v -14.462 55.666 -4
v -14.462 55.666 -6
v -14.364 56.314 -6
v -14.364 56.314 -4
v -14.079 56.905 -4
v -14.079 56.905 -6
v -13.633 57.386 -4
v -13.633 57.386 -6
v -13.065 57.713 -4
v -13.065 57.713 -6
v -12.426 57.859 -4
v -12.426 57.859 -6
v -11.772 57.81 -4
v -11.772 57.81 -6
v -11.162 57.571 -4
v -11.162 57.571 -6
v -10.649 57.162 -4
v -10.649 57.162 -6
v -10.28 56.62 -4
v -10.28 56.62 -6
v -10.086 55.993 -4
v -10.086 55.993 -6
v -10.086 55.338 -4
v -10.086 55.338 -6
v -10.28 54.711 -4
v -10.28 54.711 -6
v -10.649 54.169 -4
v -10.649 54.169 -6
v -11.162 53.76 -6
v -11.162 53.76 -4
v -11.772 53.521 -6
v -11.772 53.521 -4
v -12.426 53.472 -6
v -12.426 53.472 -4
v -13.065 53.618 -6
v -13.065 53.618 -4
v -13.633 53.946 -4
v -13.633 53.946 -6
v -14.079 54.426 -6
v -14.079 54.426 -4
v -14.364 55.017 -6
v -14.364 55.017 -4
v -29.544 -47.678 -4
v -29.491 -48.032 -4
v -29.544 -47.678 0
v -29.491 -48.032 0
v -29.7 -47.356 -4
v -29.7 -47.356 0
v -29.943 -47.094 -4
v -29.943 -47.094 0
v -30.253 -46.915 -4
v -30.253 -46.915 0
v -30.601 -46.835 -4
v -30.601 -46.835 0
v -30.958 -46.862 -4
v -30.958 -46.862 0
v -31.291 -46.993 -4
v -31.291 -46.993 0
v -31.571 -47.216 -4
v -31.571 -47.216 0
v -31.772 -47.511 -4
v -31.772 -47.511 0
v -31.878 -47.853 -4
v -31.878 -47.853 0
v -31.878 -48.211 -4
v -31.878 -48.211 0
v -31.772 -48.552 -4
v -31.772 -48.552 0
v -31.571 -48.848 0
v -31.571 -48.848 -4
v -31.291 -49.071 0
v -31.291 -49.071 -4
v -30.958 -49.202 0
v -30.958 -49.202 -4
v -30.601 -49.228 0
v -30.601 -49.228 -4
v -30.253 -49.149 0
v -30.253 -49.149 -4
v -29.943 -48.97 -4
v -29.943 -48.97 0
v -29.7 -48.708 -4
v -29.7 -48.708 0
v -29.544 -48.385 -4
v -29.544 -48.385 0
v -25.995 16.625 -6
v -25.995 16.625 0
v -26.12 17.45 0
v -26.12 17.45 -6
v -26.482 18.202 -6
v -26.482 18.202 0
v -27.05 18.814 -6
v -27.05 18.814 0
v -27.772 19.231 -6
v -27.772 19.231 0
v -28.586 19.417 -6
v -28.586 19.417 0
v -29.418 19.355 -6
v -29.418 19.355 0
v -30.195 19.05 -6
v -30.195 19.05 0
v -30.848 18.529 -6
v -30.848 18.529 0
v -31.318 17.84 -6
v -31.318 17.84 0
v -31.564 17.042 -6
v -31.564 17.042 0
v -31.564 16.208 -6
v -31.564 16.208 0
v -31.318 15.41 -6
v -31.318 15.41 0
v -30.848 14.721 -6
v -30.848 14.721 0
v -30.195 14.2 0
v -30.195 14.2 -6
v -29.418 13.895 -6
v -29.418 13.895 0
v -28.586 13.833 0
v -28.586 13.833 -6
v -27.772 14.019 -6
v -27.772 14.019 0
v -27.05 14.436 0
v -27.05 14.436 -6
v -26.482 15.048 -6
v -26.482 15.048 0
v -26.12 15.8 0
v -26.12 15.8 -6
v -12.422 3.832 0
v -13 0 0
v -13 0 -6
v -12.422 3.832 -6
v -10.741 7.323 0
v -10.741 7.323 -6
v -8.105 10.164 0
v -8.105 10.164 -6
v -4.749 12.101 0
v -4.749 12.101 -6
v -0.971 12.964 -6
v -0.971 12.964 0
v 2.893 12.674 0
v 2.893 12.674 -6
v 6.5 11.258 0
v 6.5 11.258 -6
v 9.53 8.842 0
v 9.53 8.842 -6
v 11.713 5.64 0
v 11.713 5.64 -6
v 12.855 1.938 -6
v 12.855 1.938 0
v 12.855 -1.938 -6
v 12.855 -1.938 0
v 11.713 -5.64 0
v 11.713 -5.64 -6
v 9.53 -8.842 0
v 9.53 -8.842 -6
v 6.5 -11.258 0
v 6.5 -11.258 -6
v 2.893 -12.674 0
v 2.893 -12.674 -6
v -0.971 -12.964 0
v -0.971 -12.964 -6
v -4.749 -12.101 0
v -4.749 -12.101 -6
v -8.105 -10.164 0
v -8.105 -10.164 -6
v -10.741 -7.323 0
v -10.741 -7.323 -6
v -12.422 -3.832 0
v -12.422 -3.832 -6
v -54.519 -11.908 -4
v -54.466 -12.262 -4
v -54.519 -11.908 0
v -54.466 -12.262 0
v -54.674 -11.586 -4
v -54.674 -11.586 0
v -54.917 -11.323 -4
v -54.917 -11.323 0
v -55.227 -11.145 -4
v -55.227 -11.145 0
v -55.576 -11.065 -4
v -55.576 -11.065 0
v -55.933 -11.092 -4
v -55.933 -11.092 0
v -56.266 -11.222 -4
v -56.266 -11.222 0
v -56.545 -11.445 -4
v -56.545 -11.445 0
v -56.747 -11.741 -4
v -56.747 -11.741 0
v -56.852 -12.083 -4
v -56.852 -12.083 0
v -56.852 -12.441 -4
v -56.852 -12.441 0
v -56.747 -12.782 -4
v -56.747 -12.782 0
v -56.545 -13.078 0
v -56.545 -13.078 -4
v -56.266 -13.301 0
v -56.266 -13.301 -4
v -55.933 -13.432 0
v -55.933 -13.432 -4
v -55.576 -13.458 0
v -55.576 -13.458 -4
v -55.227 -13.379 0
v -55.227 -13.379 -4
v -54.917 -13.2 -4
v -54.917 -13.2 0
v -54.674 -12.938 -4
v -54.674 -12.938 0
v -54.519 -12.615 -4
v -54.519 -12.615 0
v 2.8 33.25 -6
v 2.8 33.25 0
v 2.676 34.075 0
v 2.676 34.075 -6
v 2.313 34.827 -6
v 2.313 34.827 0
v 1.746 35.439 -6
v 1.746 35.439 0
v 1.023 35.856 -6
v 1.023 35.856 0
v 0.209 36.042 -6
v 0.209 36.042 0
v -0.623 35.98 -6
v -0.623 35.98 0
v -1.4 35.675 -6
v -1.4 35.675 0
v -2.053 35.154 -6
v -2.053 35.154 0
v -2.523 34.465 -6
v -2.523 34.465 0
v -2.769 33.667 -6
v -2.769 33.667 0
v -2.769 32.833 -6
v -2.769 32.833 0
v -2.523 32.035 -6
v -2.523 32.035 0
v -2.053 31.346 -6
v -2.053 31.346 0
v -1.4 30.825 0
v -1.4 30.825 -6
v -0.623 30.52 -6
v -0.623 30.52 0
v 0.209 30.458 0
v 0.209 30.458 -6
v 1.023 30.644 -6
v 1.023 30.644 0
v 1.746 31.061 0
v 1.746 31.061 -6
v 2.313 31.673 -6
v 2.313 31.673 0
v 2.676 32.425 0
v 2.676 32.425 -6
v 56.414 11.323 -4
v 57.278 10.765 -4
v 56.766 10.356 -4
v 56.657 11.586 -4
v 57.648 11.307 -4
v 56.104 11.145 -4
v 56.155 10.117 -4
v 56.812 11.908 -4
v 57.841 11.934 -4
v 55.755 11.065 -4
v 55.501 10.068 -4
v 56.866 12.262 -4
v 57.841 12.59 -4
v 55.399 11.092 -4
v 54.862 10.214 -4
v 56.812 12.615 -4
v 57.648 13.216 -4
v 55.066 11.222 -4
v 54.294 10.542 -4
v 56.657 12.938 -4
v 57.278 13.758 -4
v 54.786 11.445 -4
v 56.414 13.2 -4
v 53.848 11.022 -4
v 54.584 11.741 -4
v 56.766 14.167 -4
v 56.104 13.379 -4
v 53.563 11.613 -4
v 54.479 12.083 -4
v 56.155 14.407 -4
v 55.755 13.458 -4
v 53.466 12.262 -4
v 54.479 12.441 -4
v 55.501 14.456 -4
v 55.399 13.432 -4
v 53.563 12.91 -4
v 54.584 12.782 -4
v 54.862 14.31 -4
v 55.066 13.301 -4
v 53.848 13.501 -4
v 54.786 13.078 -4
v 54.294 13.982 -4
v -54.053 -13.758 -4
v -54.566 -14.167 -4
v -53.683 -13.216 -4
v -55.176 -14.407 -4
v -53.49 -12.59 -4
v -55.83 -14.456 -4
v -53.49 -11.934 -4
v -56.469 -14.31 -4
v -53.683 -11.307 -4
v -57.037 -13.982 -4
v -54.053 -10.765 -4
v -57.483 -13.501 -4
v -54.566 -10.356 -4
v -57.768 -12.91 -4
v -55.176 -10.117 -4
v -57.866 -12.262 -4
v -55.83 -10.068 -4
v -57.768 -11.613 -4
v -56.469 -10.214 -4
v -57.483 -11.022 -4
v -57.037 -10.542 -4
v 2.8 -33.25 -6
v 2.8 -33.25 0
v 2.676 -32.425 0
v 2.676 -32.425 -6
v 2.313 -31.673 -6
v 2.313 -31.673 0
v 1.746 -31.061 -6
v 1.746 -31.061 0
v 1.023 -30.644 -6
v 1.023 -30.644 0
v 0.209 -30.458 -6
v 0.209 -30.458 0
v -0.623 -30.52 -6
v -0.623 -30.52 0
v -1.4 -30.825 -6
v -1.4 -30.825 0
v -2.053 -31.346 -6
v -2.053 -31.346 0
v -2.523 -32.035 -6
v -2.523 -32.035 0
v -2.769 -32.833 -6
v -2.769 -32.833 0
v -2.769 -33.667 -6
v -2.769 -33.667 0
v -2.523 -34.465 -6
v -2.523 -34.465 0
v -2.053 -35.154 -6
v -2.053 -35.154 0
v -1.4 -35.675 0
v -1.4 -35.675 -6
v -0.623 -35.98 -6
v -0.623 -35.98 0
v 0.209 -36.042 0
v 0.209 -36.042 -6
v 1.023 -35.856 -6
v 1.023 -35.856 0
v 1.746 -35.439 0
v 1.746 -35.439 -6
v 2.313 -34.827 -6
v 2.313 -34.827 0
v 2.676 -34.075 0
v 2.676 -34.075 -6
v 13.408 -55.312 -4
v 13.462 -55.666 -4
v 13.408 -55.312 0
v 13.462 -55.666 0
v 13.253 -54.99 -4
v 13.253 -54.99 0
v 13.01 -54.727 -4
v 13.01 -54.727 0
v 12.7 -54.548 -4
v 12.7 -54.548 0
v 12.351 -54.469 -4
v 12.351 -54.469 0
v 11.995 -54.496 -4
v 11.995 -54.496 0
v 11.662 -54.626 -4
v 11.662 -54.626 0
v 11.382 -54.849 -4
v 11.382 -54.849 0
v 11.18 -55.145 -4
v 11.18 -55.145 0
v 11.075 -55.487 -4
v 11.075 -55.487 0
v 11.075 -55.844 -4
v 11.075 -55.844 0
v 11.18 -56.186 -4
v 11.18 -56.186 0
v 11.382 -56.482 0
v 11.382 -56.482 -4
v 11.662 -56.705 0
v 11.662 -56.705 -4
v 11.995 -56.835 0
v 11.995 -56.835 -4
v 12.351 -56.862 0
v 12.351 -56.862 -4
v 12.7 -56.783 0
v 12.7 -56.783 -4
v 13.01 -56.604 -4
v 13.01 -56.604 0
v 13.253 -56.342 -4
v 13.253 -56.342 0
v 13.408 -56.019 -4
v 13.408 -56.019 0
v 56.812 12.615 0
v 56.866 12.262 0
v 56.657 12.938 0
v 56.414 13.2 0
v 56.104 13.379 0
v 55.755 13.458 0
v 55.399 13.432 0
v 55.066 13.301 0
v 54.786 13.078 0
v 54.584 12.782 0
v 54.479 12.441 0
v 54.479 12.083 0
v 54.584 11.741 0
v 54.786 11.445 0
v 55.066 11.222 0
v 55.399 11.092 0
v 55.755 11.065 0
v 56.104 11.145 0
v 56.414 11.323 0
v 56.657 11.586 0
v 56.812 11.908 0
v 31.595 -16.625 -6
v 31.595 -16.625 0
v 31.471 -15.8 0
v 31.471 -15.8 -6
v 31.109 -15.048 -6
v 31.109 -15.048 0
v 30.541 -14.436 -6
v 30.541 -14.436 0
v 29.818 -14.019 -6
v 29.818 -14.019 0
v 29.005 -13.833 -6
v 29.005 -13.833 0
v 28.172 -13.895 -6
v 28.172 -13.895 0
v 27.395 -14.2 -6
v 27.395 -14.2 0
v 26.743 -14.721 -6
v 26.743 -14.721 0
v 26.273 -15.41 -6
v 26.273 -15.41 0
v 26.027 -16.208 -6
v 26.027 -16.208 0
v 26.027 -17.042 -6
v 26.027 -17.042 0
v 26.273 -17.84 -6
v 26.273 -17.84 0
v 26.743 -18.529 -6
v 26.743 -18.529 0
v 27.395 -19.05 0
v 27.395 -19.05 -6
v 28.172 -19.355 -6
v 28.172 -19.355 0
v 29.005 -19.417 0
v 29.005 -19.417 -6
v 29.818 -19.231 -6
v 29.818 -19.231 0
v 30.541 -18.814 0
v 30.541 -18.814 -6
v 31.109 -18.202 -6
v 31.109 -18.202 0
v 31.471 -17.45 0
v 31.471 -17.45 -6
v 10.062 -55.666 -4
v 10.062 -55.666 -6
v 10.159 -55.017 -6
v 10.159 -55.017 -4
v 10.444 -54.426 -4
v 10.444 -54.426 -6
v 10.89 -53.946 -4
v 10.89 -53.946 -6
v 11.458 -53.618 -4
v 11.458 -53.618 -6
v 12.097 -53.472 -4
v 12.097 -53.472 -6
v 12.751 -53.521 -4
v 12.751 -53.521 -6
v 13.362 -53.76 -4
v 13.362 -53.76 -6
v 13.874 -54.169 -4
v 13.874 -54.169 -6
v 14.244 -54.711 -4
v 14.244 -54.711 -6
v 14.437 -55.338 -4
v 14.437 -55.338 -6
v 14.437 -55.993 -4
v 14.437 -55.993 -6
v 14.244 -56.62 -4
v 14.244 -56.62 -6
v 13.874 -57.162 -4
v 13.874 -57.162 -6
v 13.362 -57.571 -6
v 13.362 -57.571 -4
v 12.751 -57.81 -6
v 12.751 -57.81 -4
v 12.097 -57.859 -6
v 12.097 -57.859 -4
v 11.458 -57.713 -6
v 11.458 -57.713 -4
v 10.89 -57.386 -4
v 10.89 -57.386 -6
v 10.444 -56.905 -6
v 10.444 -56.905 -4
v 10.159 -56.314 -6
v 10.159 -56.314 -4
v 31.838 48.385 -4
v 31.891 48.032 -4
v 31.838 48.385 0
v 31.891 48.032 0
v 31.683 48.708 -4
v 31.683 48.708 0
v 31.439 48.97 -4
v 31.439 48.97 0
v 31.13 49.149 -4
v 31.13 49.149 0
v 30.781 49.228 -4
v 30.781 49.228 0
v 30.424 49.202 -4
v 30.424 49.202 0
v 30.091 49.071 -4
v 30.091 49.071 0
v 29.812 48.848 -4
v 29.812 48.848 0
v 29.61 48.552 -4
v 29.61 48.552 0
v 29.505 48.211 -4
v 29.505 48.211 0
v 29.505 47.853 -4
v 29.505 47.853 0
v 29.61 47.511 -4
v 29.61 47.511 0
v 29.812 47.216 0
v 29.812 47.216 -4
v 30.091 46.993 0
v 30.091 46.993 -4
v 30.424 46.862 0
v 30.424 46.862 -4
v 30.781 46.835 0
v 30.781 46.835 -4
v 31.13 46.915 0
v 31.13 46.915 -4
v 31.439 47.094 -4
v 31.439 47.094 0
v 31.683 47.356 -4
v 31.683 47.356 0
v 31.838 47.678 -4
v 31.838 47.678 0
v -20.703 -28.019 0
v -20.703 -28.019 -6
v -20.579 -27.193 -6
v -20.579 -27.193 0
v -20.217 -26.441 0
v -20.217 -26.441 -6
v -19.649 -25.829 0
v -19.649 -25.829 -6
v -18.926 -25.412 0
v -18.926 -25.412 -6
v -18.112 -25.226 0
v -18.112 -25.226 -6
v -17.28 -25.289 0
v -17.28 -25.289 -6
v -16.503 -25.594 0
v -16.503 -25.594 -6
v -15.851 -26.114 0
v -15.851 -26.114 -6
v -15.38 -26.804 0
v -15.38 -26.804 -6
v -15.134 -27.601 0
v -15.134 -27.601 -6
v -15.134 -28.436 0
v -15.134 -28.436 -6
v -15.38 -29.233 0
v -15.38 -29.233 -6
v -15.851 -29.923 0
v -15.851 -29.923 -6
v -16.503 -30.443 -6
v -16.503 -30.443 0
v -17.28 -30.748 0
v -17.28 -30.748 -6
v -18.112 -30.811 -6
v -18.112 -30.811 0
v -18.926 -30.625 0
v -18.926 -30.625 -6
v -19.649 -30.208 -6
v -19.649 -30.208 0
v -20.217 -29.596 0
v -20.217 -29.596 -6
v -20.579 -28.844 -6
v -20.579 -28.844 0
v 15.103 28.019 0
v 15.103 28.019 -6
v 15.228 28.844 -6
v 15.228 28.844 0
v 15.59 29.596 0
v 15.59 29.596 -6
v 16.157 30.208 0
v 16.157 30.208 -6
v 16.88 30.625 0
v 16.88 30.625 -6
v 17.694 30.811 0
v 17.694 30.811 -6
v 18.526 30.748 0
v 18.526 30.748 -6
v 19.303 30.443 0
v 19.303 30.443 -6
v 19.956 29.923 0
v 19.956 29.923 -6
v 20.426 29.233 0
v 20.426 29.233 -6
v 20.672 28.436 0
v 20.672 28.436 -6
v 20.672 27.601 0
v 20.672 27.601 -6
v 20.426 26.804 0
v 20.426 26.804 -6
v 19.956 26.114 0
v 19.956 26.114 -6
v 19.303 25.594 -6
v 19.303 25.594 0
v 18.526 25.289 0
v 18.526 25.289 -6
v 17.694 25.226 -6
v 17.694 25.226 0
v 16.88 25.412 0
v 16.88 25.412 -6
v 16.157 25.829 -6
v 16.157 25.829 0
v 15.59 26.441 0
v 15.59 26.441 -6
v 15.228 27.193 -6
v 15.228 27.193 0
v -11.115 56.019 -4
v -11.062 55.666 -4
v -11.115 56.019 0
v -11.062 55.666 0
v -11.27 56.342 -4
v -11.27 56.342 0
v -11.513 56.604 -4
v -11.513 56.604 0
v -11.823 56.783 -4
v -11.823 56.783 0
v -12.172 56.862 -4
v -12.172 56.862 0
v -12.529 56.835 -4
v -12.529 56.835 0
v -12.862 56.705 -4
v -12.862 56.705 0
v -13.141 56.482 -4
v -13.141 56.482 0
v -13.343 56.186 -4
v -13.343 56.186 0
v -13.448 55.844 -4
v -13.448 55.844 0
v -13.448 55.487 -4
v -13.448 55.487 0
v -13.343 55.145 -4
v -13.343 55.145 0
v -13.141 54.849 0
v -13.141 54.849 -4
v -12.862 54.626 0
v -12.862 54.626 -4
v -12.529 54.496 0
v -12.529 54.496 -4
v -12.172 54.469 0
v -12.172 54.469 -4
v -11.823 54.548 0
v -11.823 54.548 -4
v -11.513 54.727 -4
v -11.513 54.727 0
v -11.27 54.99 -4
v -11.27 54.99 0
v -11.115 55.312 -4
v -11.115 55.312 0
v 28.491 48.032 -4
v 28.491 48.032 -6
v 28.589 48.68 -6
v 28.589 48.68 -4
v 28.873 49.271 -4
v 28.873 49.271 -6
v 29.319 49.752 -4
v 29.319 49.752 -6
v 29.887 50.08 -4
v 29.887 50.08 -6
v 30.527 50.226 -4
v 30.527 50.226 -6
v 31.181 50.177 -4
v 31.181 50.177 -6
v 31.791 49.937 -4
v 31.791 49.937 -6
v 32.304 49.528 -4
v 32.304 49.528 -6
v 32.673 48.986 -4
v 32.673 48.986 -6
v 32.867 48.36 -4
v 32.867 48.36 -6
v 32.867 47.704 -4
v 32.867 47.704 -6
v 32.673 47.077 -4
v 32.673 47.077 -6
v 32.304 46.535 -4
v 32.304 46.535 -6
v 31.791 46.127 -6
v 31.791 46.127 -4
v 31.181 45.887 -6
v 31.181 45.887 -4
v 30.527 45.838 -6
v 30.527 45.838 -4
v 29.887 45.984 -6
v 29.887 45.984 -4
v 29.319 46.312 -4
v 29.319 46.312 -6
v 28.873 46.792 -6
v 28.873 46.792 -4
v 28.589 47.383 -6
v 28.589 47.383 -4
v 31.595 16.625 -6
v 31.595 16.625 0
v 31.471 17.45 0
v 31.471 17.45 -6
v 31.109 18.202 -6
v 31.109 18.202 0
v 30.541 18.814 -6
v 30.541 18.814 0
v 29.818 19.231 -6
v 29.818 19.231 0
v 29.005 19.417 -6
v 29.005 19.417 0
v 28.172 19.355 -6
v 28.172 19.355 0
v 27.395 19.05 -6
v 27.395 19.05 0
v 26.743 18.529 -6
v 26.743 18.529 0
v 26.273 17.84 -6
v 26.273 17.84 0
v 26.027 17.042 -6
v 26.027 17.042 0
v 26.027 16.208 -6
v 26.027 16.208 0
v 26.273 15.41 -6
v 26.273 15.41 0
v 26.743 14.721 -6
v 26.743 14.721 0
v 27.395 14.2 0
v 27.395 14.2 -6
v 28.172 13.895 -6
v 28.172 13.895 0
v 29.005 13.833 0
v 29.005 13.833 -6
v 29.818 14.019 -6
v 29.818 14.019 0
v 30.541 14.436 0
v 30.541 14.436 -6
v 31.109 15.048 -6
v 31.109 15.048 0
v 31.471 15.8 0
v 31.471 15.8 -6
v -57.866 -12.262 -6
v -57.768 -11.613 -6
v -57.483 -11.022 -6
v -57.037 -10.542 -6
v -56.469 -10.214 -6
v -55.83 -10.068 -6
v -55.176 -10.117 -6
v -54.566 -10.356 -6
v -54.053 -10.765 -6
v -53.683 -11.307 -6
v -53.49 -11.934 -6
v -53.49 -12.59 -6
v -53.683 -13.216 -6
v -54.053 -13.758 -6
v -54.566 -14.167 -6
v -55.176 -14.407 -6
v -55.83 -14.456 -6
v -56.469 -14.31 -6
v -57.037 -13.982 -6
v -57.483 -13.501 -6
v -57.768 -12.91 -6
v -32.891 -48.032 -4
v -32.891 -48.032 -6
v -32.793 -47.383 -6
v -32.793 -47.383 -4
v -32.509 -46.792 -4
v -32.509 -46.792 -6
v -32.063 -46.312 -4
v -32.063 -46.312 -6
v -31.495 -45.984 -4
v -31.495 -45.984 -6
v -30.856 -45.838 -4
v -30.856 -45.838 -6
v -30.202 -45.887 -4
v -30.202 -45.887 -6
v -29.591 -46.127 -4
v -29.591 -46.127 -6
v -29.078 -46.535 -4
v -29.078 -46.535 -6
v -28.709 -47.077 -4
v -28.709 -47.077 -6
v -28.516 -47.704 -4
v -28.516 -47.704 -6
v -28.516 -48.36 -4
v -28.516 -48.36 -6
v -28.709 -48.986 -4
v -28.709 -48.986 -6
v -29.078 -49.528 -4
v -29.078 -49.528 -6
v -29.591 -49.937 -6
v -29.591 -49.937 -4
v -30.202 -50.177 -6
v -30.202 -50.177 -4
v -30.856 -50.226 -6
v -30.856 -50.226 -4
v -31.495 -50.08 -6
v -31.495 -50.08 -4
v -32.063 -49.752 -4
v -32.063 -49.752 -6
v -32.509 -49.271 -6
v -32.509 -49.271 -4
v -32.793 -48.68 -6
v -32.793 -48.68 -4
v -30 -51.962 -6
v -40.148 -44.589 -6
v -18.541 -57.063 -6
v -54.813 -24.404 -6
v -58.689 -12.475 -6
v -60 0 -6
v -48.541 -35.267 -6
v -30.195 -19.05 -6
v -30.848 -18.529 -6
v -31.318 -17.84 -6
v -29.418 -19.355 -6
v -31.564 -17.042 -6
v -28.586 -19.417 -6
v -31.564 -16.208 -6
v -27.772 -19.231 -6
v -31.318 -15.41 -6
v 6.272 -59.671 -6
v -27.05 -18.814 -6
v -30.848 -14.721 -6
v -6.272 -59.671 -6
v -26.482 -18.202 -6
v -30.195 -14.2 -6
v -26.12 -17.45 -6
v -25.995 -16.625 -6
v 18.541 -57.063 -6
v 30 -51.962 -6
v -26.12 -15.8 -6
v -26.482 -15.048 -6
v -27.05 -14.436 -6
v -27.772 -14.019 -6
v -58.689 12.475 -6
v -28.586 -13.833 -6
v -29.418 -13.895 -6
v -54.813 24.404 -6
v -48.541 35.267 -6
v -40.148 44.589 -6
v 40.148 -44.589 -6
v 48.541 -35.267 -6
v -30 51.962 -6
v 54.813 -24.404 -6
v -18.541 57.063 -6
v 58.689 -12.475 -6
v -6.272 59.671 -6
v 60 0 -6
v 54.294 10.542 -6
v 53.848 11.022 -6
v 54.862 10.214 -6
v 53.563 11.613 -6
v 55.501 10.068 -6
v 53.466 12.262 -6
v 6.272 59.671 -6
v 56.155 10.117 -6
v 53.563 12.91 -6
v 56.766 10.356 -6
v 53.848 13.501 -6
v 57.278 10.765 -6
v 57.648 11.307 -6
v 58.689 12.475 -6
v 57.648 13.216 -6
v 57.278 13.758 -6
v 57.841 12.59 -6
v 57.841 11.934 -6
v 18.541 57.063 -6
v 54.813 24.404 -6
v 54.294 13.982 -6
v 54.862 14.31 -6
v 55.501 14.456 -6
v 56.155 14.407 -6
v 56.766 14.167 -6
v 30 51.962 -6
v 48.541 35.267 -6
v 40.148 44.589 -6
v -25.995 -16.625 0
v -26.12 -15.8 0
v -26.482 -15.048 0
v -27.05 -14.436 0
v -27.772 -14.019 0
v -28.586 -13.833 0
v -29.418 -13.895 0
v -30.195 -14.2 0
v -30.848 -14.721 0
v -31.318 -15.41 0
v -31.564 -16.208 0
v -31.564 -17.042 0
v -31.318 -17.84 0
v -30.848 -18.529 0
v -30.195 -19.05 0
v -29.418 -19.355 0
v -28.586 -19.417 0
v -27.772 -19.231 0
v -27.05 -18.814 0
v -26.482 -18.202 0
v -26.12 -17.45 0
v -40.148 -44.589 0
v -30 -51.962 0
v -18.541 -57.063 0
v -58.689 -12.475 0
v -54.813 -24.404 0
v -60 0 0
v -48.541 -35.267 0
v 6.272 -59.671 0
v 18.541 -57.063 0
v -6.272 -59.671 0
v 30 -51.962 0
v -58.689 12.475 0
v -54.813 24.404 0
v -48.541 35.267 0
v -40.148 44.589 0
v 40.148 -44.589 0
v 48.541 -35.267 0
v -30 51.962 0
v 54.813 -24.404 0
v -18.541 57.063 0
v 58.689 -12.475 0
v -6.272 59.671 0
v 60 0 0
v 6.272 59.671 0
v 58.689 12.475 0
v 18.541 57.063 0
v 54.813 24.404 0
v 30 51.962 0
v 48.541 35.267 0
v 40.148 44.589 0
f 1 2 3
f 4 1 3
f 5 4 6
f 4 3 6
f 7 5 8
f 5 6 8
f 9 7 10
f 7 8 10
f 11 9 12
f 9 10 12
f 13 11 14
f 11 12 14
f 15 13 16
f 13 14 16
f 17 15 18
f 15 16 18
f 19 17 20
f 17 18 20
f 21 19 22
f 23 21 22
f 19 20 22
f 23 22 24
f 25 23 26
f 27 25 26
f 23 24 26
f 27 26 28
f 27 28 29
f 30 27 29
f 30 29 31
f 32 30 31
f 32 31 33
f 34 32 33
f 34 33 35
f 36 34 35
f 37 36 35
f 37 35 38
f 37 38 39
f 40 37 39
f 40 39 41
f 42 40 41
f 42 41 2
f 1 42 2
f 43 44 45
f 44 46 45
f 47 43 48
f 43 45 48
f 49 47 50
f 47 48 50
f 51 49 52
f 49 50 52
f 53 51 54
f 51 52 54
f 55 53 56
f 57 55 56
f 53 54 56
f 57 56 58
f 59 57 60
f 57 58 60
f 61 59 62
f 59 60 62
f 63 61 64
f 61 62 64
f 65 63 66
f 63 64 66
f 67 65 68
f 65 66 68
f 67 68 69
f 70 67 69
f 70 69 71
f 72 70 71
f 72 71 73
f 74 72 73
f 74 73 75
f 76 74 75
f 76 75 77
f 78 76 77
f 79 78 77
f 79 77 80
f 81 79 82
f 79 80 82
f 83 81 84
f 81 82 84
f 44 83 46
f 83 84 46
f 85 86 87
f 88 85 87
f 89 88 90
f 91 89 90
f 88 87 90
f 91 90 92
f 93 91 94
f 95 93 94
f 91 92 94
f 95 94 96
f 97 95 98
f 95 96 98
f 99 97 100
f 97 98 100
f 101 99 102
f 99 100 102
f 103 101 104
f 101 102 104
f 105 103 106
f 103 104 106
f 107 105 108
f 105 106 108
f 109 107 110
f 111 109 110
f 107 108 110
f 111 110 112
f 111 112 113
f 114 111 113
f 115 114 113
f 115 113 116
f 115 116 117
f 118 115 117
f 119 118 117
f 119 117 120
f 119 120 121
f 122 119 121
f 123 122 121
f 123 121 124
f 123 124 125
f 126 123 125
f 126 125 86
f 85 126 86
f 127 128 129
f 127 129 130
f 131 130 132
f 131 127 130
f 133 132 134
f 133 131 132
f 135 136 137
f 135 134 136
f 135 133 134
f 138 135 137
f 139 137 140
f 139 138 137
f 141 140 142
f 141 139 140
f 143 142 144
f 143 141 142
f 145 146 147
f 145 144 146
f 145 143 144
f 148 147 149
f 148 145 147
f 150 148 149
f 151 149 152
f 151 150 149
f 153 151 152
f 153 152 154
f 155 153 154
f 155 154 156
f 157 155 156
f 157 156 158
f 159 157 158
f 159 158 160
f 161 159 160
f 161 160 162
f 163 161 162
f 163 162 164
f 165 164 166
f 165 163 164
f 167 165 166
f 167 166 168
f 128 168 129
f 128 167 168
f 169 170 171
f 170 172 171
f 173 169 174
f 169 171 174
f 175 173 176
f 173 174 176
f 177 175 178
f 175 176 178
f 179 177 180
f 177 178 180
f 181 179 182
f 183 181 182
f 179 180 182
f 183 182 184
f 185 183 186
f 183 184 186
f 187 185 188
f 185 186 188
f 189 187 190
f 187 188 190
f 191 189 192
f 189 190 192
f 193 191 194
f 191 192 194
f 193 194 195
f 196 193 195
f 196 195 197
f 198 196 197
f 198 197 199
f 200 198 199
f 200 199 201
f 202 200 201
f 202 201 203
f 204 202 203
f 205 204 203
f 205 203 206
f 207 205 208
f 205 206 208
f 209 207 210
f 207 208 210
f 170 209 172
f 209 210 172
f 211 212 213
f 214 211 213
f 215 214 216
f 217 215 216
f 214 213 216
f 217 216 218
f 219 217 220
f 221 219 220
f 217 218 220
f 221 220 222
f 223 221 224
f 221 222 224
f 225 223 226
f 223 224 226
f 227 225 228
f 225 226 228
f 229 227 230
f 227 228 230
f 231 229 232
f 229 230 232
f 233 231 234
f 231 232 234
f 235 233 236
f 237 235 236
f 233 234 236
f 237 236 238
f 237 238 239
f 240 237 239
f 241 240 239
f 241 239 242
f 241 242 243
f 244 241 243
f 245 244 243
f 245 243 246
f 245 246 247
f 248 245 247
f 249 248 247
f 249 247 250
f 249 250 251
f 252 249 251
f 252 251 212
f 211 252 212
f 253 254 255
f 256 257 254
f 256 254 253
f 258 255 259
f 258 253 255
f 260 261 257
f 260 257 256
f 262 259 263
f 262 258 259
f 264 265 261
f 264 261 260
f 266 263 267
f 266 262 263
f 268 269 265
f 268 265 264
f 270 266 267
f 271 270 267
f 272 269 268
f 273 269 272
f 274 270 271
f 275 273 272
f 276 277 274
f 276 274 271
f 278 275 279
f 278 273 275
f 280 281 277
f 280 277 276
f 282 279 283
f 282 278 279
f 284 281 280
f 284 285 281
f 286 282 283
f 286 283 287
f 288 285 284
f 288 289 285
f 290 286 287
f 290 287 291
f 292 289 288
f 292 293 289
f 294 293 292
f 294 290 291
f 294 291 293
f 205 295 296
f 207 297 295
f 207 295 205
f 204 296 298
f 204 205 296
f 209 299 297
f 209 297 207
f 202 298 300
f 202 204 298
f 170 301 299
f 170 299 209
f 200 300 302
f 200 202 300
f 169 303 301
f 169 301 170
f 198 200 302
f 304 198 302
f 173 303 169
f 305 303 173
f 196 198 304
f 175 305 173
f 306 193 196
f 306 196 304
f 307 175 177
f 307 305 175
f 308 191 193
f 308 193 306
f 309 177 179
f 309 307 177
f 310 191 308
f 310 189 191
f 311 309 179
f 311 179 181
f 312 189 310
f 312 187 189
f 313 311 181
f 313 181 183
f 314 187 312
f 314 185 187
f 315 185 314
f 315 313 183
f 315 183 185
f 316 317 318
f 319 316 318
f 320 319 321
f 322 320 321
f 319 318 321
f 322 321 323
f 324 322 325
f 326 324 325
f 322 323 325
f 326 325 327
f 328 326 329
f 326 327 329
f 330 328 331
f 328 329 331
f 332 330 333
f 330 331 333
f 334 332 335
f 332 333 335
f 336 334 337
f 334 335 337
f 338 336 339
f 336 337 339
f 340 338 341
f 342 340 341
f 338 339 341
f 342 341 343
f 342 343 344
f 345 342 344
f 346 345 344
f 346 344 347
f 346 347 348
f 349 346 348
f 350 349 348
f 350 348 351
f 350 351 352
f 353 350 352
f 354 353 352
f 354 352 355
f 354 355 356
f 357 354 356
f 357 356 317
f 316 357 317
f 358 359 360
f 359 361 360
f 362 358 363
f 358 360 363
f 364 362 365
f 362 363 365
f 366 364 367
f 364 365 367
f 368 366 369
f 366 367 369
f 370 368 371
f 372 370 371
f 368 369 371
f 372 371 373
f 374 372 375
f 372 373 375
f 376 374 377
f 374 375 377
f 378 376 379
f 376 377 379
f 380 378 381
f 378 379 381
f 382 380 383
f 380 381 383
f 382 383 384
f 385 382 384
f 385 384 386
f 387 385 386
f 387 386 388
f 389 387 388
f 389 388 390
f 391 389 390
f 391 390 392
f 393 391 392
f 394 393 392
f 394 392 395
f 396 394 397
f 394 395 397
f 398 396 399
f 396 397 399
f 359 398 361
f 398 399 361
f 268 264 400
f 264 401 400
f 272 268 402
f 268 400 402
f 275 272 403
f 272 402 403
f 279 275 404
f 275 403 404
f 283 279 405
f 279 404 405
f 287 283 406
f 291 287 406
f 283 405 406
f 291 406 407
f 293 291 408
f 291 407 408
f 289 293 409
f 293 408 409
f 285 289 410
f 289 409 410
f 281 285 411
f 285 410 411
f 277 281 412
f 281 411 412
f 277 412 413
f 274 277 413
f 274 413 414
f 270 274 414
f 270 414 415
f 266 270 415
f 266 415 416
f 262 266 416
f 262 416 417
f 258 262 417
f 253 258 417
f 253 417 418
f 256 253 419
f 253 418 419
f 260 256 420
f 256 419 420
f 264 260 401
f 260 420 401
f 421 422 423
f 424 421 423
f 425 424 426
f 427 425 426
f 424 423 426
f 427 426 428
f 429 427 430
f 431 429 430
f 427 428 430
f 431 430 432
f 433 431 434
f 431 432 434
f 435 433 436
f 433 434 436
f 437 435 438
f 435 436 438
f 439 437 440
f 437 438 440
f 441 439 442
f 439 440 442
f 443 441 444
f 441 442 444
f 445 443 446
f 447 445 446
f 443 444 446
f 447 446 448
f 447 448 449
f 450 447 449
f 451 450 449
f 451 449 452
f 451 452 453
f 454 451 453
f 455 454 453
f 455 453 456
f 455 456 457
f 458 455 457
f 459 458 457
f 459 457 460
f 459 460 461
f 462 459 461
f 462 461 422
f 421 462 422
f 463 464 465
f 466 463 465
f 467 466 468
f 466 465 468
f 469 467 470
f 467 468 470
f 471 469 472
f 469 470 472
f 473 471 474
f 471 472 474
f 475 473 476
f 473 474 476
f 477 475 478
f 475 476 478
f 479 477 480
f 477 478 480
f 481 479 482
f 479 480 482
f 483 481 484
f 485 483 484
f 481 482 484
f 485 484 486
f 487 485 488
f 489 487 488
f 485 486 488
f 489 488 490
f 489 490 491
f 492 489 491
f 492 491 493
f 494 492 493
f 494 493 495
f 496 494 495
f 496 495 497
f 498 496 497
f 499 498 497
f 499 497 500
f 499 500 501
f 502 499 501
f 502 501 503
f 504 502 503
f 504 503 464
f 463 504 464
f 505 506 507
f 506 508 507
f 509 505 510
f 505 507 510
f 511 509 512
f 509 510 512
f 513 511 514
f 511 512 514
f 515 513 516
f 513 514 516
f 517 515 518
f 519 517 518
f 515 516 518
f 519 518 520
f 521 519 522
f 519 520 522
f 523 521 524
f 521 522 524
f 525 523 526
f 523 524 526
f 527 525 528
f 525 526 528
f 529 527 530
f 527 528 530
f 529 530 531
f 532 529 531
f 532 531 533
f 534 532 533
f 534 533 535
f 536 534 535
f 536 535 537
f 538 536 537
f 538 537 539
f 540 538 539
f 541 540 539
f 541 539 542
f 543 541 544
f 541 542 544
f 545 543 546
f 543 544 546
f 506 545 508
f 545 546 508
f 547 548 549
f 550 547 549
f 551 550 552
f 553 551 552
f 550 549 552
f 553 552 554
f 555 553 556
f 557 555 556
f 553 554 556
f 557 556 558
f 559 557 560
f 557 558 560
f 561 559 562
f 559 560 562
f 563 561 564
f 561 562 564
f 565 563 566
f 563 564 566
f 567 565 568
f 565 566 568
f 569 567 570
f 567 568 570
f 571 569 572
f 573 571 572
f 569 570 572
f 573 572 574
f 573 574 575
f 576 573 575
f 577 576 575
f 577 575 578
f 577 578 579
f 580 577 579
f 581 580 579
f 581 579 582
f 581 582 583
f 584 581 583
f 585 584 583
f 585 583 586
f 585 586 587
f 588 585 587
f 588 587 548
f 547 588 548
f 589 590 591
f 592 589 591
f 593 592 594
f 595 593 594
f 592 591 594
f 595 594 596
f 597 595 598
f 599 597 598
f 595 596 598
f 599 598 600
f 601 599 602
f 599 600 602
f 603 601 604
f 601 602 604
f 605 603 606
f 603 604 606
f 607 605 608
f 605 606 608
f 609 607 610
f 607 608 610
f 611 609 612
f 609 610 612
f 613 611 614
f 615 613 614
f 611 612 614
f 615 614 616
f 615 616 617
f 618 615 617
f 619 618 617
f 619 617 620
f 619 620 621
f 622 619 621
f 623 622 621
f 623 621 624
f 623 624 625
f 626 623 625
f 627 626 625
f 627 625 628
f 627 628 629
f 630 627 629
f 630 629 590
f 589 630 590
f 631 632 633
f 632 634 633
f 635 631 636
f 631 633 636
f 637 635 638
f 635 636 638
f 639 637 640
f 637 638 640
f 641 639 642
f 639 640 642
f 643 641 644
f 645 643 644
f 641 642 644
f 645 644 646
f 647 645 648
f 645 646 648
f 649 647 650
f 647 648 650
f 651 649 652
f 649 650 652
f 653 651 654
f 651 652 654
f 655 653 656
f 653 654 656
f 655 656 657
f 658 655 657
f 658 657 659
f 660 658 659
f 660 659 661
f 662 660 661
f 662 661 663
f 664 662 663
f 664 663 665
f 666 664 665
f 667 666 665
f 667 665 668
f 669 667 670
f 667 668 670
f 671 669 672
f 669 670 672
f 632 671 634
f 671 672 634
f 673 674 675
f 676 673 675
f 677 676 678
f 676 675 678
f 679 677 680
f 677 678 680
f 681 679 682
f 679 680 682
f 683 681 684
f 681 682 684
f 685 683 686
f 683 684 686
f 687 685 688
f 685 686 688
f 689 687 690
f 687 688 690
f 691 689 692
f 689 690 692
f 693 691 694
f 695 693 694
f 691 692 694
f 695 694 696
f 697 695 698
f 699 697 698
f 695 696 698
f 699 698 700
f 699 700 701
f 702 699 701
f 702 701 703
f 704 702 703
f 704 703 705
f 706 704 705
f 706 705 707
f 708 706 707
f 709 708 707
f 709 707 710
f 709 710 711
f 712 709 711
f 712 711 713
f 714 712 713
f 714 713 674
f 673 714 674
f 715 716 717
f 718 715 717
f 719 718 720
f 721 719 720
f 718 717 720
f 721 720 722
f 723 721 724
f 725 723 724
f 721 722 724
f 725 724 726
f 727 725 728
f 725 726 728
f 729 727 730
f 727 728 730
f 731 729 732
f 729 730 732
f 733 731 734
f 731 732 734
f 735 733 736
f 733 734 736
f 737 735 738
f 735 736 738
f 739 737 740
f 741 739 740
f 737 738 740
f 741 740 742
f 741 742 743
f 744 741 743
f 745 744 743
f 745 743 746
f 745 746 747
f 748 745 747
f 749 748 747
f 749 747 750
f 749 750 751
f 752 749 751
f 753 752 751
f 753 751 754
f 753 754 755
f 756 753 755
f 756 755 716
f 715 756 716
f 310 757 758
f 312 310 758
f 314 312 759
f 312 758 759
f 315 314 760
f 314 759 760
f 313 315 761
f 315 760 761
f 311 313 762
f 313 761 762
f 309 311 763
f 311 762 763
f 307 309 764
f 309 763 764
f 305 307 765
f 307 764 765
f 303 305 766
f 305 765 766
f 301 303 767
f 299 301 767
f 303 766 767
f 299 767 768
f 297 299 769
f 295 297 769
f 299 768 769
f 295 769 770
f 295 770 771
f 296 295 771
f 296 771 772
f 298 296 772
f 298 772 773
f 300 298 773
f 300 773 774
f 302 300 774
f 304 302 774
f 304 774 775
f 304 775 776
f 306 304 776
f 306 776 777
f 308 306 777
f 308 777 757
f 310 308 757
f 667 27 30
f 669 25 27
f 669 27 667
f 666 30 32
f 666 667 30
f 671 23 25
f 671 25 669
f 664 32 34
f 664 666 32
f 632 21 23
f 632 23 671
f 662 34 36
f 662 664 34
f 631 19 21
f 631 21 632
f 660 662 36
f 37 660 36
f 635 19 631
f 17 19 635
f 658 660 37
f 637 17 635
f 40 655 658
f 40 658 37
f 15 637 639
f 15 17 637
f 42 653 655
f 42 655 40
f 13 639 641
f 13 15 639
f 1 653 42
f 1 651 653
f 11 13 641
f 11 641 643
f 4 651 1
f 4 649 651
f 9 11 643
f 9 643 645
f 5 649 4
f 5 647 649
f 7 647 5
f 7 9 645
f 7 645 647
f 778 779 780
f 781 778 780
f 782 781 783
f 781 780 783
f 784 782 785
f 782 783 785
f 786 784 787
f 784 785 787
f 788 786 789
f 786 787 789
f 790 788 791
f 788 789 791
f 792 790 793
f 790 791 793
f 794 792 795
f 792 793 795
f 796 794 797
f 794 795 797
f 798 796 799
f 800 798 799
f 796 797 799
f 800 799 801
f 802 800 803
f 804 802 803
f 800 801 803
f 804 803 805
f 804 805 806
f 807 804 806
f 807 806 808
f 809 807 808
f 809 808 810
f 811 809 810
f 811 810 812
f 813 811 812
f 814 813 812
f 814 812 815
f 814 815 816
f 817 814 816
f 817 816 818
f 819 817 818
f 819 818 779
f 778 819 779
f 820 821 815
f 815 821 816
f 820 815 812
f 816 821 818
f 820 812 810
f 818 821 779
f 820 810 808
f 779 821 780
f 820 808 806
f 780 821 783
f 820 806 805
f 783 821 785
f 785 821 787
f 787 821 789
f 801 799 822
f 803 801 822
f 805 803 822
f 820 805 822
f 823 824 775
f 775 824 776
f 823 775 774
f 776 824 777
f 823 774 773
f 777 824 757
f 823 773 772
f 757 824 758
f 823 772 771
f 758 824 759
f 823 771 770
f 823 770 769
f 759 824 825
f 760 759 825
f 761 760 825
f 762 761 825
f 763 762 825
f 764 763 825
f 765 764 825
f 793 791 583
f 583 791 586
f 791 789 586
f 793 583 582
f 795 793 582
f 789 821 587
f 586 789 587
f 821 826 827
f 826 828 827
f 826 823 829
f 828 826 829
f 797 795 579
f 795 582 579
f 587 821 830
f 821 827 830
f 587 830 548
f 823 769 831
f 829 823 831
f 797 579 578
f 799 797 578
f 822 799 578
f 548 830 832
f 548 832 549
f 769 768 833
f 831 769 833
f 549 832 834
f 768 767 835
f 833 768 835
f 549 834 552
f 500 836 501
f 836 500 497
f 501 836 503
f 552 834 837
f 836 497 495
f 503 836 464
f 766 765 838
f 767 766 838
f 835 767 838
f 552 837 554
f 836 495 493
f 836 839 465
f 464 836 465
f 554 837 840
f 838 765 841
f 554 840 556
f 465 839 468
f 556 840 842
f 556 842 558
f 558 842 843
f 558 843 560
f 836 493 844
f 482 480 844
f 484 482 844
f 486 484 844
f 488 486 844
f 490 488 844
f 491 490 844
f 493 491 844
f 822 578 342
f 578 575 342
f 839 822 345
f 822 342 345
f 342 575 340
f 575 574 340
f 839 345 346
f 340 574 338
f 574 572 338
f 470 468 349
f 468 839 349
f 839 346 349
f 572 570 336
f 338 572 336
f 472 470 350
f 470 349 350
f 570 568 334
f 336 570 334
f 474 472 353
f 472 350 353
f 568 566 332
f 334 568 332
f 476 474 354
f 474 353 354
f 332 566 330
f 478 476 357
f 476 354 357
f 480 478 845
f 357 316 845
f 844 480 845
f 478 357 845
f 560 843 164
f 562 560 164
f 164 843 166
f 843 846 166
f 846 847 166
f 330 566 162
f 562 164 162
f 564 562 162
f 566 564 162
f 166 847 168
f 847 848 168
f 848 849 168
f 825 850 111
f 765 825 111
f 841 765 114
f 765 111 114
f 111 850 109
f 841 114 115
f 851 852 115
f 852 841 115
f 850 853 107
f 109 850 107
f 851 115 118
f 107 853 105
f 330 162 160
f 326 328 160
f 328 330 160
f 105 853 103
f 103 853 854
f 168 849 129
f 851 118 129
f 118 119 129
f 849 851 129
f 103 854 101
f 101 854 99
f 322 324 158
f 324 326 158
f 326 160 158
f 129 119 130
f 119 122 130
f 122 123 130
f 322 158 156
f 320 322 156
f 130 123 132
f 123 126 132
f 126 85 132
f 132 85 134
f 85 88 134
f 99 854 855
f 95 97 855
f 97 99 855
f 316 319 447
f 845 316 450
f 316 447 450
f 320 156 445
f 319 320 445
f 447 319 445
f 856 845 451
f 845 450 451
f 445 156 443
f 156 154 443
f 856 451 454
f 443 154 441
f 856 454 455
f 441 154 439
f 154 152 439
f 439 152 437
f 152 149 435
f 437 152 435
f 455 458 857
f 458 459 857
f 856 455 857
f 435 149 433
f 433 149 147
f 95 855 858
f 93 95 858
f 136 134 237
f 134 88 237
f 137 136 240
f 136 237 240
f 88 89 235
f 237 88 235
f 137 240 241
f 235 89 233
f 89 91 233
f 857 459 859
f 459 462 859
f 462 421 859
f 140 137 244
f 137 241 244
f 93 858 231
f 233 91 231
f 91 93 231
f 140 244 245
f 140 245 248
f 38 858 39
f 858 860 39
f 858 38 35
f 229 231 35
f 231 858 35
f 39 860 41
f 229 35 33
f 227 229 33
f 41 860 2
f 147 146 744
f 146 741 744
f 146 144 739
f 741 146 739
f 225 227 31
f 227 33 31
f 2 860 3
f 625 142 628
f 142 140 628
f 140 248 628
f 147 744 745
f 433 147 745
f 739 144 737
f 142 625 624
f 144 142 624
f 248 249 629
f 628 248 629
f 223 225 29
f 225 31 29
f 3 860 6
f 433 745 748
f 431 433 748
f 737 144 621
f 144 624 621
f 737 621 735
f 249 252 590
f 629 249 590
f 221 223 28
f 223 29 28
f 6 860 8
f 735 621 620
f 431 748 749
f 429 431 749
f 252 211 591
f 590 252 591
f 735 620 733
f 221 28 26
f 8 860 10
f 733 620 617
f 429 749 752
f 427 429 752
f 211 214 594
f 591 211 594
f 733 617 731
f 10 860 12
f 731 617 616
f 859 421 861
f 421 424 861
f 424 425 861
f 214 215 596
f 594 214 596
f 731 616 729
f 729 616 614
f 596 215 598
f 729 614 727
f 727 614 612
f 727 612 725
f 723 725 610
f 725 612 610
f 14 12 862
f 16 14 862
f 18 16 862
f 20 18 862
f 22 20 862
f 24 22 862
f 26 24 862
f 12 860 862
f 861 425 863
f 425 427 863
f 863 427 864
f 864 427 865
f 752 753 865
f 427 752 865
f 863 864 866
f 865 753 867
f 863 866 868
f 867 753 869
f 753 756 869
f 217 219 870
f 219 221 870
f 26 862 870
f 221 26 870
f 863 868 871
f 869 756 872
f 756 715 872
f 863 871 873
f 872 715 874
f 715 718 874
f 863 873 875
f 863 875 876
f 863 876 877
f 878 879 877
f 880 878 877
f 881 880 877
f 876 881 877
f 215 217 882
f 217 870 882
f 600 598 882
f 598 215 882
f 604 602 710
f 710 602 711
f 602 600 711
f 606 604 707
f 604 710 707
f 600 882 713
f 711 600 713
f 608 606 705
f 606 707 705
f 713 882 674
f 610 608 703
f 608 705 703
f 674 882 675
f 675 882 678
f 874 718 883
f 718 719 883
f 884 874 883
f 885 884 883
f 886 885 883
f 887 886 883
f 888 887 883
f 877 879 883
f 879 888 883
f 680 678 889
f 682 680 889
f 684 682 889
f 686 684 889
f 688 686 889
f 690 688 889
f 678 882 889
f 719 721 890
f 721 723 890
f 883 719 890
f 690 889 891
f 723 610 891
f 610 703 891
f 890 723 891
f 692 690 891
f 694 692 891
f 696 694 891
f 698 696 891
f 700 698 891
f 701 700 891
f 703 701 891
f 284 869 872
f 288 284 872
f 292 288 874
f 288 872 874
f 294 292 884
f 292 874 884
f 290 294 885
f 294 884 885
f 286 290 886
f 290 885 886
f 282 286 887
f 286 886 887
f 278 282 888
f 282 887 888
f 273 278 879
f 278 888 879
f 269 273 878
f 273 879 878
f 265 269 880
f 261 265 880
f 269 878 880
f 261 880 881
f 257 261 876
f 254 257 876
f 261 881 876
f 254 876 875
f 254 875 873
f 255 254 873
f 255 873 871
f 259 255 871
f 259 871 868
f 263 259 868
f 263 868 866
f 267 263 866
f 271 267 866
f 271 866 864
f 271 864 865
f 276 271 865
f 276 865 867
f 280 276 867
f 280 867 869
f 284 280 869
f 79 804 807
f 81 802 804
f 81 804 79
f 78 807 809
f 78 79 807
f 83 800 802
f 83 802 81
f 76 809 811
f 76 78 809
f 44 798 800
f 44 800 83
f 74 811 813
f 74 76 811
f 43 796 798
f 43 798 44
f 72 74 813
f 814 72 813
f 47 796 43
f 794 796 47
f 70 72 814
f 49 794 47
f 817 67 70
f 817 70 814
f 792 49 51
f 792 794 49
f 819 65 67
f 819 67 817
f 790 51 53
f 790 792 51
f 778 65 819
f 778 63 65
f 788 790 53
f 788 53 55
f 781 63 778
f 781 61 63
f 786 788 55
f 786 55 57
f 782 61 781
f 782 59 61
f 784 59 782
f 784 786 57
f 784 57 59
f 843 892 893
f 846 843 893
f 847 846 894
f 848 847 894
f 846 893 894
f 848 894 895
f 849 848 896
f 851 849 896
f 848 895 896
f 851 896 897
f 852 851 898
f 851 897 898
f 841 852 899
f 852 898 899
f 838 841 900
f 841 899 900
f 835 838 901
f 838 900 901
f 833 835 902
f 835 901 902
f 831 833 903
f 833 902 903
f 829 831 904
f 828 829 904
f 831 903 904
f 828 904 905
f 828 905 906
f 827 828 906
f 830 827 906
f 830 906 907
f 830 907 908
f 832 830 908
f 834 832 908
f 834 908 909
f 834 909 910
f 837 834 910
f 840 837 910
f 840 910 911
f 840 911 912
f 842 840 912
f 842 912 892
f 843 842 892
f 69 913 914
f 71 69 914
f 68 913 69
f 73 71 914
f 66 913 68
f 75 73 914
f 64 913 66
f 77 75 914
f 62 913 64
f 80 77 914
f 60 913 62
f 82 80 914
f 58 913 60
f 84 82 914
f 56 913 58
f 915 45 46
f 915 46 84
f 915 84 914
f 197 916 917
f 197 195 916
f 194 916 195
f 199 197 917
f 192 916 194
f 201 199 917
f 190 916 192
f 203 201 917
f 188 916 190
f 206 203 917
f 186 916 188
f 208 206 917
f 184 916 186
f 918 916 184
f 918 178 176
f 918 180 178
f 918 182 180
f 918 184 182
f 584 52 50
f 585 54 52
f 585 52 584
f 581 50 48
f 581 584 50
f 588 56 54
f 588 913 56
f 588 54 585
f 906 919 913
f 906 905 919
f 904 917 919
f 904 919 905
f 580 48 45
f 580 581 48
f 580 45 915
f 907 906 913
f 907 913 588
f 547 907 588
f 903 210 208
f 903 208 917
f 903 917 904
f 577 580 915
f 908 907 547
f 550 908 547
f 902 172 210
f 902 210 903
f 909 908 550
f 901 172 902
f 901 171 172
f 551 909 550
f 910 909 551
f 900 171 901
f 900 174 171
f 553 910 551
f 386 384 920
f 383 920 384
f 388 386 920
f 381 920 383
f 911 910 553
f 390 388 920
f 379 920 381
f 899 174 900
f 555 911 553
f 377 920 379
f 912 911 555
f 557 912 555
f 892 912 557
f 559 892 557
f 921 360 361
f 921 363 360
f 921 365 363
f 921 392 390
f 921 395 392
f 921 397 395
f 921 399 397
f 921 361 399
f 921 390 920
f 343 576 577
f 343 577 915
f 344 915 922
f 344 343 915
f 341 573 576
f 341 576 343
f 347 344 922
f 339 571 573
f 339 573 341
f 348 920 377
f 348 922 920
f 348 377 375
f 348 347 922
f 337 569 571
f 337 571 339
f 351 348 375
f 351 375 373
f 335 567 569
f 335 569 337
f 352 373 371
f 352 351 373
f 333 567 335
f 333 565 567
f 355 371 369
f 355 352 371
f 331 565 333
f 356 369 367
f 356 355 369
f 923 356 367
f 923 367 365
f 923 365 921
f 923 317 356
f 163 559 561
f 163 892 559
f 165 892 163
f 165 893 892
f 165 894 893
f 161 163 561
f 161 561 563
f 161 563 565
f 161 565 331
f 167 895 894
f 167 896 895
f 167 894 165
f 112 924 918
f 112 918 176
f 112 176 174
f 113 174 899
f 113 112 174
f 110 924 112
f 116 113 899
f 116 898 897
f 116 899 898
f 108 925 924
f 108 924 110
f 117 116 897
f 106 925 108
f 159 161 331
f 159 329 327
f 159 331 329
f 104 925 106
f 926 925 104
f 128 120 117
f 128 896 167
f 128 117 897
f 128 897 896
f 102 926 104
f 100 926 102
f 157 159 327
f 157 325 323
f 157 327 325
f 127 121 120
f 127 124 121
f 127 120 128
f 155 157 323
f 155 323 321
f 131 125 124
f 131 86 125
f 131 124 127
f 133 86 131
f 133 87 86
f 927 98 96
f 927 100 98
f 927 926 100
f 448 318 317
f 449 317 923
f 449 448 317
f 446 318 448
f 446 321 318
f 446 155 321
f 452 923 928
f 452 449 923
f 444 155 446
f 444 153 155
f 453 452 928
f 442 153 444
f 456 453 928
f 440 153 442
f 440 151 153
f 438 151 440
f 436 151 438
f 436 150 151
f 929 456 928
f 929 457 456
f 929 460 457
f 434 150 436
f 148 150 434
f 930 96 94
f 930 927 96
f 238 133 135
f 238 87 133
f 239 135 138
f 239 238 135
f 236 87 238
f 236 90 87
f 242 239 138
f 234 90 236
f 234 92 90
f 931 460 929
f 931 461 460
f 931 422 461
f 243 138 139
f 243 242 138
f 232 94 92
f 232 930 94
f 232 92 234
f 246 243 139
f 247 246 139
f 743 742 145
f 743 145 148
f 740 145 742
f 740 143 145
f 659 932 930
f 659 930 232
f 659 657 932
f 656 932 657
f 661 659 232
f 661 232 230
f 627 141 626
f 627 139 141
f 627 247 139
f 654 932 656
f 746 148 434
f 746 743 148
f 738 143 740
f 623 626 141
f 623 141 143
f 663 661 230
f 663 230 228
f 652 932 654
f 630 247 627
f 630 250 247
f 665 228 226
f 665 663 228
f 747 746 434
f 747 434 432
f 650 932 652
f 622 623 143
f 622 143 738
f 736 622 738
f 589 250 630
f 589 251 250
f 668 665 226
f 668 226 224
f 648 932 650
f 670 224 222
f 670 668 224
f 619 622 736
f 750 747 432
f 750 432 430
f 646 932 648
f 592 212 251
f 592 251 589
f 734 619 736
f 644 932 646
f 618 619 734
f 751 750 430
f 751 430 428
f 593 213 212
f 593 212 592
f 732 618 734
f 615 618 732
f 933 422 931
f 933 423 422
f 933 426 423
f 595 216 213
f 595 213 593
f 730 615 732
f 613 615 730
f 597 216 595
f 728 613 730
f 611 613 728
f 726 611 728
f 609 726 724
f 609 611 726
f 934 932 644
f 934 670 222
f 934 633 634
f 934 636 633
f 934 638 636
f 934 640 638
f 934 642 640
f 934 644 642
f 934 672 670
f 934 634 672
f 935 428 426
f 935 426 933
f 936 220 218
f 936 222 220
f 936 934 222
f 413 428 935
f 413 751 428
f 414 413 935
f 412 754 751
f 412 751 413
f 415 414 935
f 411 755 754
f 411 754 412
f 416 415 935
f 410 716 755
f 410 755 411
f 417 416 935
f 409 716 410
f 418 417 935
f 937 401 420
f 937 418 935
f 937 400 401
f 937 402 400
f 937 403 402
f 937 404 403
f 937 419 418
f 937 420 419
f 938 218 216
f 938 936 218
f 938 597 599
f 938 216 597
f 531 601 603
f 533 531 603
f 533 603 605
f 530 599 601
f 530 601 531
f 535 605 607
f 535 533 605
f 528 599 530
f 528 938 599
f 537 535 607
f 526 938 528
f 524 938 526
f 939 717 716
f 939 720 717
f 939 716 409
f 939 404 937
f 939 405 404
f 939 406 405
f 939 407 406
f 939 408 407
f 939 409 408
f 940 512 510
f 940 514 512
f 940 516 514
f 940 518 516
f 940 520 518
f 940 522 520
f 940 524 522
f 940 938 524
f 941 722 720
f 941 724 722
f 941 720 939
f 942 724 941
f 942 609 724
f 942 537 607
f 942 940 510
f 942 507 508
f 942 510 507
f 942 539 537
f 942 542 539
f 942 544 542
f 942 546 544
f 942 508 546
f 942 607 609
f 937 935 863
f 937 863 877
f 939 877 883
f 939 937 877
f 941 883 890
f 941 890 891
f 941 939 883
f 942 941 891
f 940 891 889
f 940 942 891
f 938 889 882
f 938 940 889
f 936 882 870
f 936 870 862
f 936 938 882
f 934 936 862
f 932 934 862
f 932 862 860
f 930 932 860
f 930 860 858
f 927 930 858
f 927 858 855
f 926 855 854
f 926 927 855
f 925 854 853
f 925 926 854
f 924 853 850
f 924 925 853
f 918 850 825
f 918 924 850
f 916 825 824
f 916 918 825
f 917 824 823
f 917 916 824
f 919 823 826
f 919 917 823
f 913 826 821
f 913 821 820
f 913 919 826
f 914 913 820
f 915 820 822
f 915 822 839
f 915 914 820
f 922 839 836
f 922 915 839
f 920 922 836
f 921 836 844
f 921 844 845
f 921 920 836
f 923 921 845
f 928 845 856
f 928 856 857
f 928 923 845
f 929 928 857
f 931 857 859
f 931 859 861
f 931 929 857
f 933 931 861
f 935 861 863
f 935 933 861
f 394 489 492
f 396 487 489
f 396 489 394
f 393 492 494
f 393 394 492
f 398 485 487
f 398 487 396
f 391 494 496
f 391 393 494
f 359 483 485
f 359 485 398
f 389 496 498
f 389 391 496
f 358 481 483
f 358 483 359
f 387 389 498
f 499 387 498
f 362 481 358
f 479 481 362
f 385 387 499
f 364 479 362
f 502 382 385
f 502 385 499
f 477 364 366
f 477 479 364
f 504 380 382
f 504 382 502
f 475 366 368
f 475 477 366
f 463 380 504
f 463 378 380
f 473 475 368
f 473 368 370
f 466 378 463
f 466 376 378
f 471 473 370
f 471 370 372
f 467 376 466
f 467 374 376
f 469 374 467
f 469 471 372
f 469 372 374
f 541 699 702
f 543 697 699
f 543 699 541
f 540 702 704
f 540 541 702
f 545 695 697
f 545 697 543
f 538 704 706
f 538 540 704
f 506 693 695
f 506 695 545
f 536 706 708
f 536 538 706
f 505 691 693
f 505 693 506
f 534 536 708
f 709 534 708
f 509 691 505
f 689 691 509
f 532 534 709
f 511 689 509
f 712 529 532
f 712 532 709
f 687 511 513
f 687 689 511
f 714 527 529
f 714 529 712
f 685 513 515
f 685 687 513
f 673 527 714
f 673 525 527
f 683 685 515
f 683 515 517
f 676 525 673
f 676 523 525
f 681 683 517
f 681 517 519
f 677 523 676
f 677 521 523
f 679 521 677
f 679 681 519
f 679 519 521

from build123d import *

# Parameters (mm, degrees)
SKETCH1_R                      = 60
BOSS_EXTRUDE1_DEPTH            = 6
CUT_EXTRUDE1_DEPTH             = 86.064681273
CUT_EXTRUDE1_DEPTH_BACK        = 86.064681273
SKETCH2_R                      = 13
F_4_0MM_DOWEL_HOLE1_D          = 5.6
F_1_0MM_DOWEL_HOLE1_D          = 5.6
CBORE_FOR_M2_SHCS3_D           = 2.4
CBORE_FOR_M2_SHCS3_CBORE_D     = 4.4
CBORE_FOR_M2_SHCS3_CBORE_DEPTH = 2


with BuildPart() as part:
    # Sketch1 → Boss-Extrude1 (new body)
    with BuildSketch(Plane.XY):
        Circle(SKETCH1_R)
    extrude(amount=-BOSS_EXTRUDE1_DEPTH)

    # Sketch2 → Cut-Extrude1 (cut, two sides: drawn at the far end of the back side and taken through both)
    with BuildSketch(Plane(origin=(0, 0, -6), x_dir=(-1, 0, 0), z_dir=(0, 0, -1)).offset(-CUT_EXTRUDE1_DEPTH_BACK)):
        Circle(SKETCH2_R)
    extrude(amount=CUT_EXTRUDE1_DEPTH + CUT_EXTRUDE1_DEPTH_BACK, mode=Mode.SUBTRACT)

    # Ø4.0mm Dowel Hole1 (through all)
    with Locations(Plane(origin=(0, 0, -6), x_dir=(-1, 0, 0), z_dir=(0, 0, -1))):
        with Locations((0, 0), (0, -33.25), (-28.795344676, -16.625), (-28.795344676, 16.625), (0, 33.25), (28.795344676, 16.625), (28.795344676, -16.625)):
            Hole(F_4_0MM_DOWEL_HOLE1_D / 2)

    # Ø1.0mm Dowel Hole1 (through all)
    with Locations(Plane.XY):
        with Locations((17.903184603, 28.018538168), (-17.903184603, -28.018538168)):
            Hole(F_1_0MM_DOWEL_HOLE1_D / 2)

    # CBORE for M2 SHCS3 (through all)
    with Locations(Plane(origin=(0, 0, -6), x_dir=(-1, 0, 0), z_dir=(0, 0, -1))):
        with Locations((-55.665534129, 12.261660172), (-30.691173604, 48.031779717), (12.261660172, 55.665534129), (55.665534129, -12.261660172), (30.691173604, -48.031779717), (-12.261660172, -55.665534129)):
            CounterBoreHole(CBORE_FOR_M2_SHCS3_D / 2, CBORE_FOR_M2_SHCS3_CBORE_D / 2, CBORE_FOR_M2_SHCS3_CBORE_DEPTH)


solid = part.part
